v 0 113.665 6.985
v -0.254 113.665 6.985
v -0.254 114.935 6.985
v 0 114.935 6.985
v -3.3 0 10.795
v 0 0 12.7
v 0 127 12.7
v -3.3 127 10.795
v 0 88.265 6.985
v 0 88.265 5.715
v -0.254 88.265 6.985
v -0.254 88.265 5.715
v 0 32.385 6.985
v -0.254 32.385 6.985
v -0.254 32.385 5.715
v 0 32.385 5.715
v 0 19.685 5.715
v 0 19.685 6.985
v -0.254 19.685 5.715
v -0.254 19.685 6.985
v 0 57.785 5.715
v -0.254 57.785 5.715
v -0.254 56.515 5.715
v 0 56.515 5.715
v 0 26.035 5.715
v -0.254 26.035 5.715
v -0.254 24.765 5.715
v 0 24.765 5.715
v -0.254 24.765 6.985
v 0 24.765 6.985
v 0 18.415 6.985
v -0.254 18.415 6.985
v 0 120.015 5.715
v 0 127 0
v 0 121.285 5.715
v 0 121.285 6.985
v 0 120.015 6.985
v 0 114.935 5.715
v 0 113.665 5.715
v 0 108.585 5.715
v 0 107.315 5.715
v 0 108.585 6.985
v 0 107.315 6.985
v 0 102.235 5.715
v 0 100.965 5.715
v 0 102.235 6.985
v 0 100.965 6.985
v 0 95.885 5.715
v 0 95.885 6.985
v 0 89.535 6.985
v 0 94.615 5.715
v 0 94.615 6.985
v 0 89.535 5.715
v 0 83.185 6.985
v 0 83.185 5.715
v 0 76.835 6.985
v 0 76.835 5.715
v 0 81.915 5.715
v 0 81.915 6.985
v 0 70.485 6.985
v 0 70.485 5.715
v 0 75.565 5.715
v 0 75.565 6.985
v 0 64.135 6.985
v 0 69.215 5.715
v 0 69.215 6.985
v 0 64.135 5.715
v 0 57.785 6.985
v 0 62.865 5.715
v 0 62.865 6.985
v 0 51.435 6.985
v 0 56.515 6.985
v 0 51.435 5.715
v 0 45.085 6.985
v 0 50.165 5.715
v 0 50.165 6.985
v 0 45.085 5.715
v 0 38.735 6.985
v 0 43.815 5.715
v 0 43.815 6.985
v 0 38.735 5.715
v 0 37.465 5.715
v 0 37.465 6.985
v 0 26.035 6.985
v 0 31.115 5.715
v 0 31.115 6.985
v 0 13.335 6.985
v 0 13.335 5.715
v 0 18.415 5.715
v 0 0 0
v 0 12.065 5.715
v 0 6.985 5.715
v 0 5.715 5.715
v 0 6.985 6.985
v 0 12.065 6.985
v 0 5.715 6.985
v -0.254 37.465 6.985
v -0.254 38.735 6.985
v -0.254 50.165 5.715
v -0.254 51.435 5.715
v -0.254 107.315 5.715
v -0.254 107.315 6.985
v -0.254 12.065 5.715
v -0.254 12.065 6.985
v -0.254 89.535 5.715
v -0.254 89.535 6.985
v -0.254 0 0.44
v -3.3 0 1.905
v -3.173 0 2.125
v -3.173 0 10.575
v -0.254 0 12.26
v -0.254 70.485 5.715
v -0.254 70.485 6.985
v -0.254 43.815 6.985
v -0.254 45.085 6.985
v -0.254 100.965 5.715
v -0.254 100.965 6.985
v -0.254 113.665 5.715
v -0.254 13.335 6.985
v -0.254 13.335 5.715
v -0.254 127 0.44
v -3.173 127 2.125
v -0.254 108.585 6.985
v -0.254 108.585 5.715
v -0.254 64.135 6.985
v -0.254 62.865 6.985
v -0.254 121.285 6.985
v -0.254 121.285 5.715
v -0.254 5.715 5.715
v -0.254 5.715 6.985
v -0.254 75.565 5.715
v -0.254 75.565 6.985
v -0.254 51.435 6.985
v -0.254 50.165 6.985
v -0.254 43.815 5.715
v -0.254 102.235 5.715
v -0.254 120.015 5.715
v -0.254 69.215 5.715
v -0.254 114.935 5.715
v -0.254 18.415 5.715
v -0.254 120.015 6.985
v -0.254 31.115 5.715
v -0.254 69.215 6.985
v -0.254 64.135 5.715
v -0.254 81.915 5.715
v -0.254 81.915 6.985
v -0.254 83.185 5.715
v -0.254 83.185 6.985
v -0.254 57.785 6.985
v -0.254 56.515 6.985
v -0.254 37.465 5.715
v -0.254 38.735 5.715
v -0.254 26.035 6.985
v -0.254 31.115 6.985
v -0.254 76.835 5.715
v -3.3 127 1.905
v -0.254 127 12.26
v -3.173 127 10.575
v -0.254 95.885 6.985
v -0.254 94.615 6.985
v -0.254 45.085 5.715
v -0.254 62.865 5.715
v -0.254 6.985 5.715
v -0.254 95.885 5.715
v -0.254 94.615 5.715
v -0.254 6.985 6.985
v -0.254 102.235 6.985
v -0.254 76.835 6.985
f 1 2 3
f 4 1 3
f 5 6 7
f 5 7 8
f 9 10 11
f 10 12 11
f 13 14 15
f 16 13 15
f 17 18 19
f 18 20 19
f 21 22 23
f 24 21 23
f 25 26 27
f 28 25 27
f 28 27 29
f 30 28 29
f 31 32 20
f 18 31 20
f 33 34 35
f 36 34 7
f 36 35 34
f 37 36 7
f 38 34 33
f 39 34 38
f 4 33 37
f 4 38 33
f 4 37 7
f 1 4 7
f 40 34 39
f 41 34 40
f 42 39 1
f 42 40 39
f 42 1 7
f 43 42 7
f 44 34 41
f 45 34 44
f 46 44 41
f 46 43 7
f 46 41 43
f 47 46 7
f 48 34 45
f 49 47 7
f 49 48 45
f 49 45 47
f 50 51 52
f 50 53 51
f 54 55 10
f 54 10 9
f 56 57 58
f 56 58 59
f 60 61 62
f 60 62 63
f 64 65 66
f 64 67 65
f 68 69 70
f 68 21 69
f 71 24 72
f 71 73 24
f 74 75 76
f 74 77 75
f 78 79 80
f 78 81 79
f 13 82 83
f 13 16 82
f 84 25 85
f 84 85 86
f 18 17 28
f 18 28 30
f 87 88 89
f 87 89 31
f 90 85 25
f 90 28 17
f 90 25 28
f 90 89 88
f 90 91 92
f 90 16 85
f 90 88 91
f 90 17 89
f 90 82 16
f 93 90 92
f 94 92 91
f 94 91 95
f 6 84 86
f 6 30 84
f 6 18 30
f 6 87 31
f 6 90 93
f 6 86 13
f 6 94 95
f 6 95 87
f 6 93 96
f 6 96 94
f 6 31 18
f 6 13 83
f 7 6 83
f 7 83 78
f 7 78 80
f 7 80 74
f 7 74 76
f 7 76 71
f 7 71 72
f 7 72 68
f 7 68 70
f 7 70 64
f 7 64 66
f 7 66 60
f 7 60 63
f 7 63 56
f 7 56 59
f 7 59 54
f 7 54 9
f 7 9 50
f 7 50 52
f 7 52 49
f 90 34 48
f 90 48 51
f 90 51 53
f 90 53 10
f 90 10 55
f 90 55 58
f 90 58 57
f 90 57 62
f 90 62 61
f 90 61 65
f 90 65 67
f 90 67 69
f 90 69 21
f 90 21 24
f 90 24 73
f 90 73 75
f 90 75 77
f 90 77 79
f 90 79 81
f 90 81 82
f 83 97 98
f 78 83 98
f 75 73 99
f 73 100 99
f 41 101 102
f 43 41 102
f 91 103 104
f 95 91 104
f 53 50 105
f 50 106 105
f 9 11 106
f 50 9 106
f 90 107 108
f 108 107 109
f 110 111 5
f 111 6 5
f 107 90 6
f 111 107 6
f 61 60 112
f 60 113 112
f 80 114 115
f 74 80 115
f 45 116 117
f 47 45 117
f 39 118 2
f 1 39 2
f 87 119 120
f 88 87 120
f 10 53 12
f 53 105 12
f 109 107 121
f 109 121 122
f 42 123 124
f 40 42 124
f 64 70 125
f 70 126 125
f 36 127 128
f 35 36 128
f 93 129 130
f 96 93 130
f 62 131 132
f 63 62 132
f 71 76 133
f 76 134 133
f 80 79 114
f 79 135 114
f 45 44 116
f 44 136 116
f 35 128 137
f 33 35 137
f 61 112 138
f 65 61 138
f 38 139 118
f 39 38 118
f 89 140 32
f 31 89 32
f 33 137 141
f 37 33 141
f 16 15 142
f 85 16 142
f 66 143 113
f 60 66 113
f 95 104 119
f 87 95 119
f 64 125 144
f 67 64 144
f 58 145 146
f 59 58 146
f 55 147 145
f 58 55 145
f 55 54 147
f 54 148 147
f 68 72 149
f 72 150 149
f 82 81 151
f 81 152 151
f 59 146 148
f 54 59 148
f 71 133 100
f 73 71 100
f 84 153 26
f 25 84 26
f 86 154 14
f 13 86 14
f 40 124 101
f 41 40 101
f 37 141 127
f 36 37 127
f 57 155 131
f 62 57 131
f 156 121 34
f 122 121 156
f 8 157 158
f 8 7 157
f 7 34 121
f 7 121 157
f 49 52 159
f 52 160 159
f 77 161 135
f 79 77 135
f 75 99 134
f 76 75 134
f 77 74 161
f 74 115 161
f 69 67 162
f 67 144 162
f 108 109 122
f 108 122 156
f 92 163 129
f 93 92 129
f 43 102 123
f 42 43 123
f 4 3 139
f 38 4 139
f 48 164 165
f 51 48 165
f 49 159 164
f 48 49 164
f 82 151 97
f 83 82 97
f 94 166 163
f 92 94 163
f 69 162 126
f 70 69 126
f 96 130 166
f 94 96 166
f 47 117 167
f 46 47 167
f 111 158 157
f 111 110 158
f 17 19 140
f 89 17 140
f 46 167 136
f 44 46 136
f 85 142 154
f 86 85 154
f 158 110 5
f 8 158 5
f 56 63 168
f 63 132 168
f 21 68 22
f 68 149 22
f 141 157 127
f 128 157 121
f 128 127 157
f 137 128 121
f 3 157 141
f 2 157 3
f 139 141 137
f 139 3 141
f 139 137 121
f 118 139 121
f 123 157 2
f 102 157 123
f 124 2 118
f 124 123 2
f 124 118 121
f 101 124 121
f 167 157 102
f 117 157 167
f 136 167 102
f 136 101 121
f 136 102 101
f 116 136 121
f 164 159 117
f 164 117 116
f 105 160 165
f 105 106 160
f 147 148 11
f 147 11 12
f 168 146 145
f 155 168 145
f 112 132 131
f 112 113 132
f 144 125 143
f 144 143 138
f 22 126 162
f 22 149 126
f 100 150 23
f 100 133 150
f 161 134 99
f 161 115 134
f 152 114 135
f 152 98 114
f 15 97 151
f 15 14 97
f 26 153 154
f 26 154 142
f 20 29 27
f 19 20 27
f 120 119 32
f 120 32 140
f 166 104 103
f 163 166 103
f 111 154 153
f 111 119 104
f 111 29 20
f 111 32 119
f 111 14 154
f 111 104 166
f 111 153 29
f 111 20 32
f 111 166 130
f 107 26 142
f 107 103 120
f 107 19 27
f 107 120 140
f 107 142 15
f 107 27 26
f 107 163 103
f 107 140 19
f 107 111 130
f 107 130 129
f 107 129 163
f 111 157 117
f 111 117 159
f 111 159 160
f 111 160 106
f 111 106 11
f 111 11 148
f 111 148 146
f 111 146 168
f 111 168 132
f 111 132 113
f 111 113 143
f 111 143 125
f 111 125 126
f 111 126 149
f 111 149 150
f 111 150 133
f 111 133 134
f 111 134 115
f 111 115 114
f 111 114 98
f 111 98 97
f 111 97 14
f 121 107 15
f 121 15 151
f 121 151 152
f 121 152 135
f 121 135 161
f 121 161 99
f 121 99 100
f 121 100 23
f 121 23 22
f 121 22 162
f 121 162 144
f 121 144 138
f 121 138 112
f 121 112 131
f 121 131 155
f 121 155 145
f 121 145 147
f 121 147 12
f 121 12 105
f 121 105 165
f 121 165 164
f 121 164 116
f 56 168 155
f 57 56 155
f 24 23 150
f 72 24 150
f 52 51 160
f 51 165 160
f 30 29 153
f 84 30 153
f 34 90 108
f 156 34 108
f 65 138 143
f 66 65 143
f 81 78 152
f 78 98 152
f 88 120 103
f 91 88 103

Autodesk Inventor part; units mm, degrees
ref_plane "YZ Plane" through (0, 0, 0) normal (1, 0, 0) x (0, 1, 0)
ref_plane "XZ Plane" through (0, 0, 0) normal (0, 1, 0) x (-1, 0, 0)
ref_plane "XY Plane" through (0, 0, 0) normal (0, 0, 1) x (1, 0, 0)
sketch "Sketch1" plane through (0, 0, 0) normal (0, 1, 0) x (-1, 0, 0)
  line L0 (0, 0) -> (0, 12.7)
  line L1 (0, 12.7) -> (3.2996, 10.795)
  line L2 (0, 0) -> (3.2996, 1.905)
  line L3 (0, 0) -> (3.81, 0) construction
  line L4 (3.1726, 10.575) -> (0.254, 12.2601)
  line L5 (0.254, 12.2601) -> (0.254, 0.4399)
  line L6 (0.254, 0.4399) -> (3.1726, 2.125)
  line L7 (3.1726, 10.575) -> (3.2996, 10.795)
  line L8 (3.1726, 2.125) -> (3.2996, 1.905)
  dimension "d0" = 12.7
  dimension "d1" = 3.81
  dimension "d2" = 60
  dimension "d3" = 30
  dimension "d4" = 0.254
extrude "Extrusion1" add sketch "Sketch1" along normal blind 127
sketch "Sketch2" plane through (-0.254, 0, 0.4399) normal (-1, 0, 0) x (0, 0, 1)
  line L0 (5.2751, 5.715) -> (6.5451, 5.715)
  line L1 (6.5451, 5.715) -> (6.5451, 6.985)
  line L2 (6.5451, 6.985) -> (5.2751, 6.985)
  line L3 (5.2751, 6.985) -> (5.2751, 5.715)
  line L4 (5.2751, 5.715) -> (6.5451, 6.985) construction
  line L5 (6.5451, 5.715) -> (5.2751, 6.985) construction
  line L6 (6.5451, 12.065) -> (6.5451, 13.335)
  line L7 (6.5451, 13.335) -> (5.2751, 13.335)
  line L8 (5.2751, 13.335) -> (5.2751, 12.065)
  line L9 (5.2751, 12.065) -> (6.5451, 12.065)
  line L10 (6.5451, 18.415) -> (6.5451, 19.685)
  line L11 (6.5451, 19.685) -> (5.2751, 19.685)
  line L12 (5.2751, 19.685) -> (5.2751, 18.415)
  line L13 (5.2751, 18.415) -> (6.5451, 18.415)
  line L14 (6.5451, 24.765) -> (6.5451, 26.035)
  line L15 (6.5451, 26.035) -> (5.2751, 26.035)
  line L16 (5.2751, 26.035) -> (5.2751, 24.765)
  line L17 (5.2751, 24.765) -> (6.5451, 24.765)
  line L18 (6.5451, 31.115) -> (6.5451, 32.385)
  line L19 (6.5451, 32.385) -> (5.2751, 32.385)
  line L20 (5.2751, 32.385) -> (5.2751, 31.115)
  line L21 (5.2751, 31.115) -> (6.5451, 31.115)
  line L22 (6.5451, 37.465) -> (6.5451, 38.735)
  line L23 (6.5451, 38.735) -> (5.2751, 38.735)
  line L24 (5.2751, 38.735) -> (5.2751, 37.465)
  line L25 (5.2751, 37.465) -> (6.5451, 37.465)
  line L26 (6.5451, 43.815) -> (6.5451, 45.085)
  line L27 (6.5451, 45.085) -> (5.2751, 45.085)
  line L28 (5.2751, 45.085) -> (5.2751, 43.815)
  line L29 (5.2751, 43.815) -> (6.5451, 43.815)
  line L30 (6.5451, 50.165) -> (6.5451, 51.435)
  line L31 (6.5451, 51.435) -> (5.2751, 51.435)
  line L32 (5.2751, 51.435) -> (5.2751, 50.165)
  line L33 (5.2751, 50.165) -> (6.5451, 50.165)
  line L34 (6.5451, 56.515) -> (6.5451, 57.785)
  line L35 (6.5451, 57.785) -> (5.2751, 57.785)
  line L36 (5.2751, 57.785) -> (5.2751, 56.515)
  line L37 (5.2751, 56.515) -> (6.5451, 56.515)
  line L38 (6.5451, 62.865) -> (6.5451, 64.135)
  line L39 (6.5451, 64.135) -> (5.2751, 64.135)
  line L40 (5.2751, 64.135) -> (5.2751, 62.865)
  line L41 (5.2751, 62.865) -> (6.5451, 62.865)
  line L42 (6.5451, 69.215) -> (6.5451, 70.485)
  line L43 (6.5451, 70.485) -> (5.2751, 70.485)
  line L44 (5.2751, 70.485) -> (5.2751, 69.215)
  line L45 (5.2751, 69.215) -> (6.5451, 69.215)
  line L46 (6.5451, 75.565) -> (6.5451, 76.835)
  line L47 (6.5451, 76.835) -> (5.2751, 76.835)
  line L48 (5.2751, 76.835) -> (5.2751, 75.565)
  line L49 (5.2751, 75.565) -> (6.5451, 75.565)
  line L50 (6.5451, 81.915) -> (6.5451, 83.185)
  line L51 (6.5451, 83.185) -> (5.2751, 83.185)
  line L52 (5.2751, 83.185) -> (5.2751, 81.915)
  line L53 (5.2751, 81.915) -> (6.5451, 81.915)
  line L54 (6.5451, 88.265) -> (6.5451, 89.535)
  line L55 (6.5451, 89.535) -> (5.2751, 89.535)
  line L56 (5.2751, 89.535) -> (5.2751, 88.265)
  line L57 (5.2751, 88.265) -> (6.5451, 88.265)
  line L58 (6.5451, 94.615) -> (6.5451, 95.885)
  line L59 (6.5451, 95.885) -> (5.2751, 95.885)
  line L60 (5.2751, 95.885) -> (5.2751, 94.615)
  line L61 (5.2751, 94.615) -> (6.5451, 94.615)
  line L62 (6.5451, 100.965) -> (6.5451, 102.235)
  line L63 (6.5451, 102.235) -> (5.2751, 102.235)
  line L64 (5.2751, 102.235) -> (5.2751, 100.965)
  line L65 (5.2751, 100.965) -> (6.5451, 100.965)
  line L66 (6.5451, 107.315) -> (6.5451, 108.585)
  line L67 (6.5451, 108.585) -> (5.2751, 108.585)
  line L68 (5.2751, 108.585) -> (5.2751, 107.315)
  line L69 (5.2751, 107.315) -> (6.5451, 107.315)
  line L70 (6.5451, 113.665) -> (6.5451, 114.935)
  line L71 (6.5451, 114.935) -> (5.2751, 114.935)
  line L72 (5.2751, 114.935) -> (5.2751, 113.665)
  line L73 (5.2751, 113.665) -> (6.5451, 113.665)
  line L74 (6.5451, 120.015) -> (6.5451, 121.285)
  line L75 (6.5451, 121.285) -> (5.2751, 121.285)
  line L76 (5.2751, 121.285) -> (5.2751, 120.015)
  line L77 (5.2751, 120.015) -> (6.5451, 120.015)
  point P0 (-0.4399, 0)
  point P1 (5.9101, 6.35)
  dimension "d7" = 1.27
  dimension "d8" = 1.27
  dimension "d14" = 6.35
extrude "Extrusion2" cut sketch "Sketch2" against normal blind 0.254
properties part number "Thing1"
